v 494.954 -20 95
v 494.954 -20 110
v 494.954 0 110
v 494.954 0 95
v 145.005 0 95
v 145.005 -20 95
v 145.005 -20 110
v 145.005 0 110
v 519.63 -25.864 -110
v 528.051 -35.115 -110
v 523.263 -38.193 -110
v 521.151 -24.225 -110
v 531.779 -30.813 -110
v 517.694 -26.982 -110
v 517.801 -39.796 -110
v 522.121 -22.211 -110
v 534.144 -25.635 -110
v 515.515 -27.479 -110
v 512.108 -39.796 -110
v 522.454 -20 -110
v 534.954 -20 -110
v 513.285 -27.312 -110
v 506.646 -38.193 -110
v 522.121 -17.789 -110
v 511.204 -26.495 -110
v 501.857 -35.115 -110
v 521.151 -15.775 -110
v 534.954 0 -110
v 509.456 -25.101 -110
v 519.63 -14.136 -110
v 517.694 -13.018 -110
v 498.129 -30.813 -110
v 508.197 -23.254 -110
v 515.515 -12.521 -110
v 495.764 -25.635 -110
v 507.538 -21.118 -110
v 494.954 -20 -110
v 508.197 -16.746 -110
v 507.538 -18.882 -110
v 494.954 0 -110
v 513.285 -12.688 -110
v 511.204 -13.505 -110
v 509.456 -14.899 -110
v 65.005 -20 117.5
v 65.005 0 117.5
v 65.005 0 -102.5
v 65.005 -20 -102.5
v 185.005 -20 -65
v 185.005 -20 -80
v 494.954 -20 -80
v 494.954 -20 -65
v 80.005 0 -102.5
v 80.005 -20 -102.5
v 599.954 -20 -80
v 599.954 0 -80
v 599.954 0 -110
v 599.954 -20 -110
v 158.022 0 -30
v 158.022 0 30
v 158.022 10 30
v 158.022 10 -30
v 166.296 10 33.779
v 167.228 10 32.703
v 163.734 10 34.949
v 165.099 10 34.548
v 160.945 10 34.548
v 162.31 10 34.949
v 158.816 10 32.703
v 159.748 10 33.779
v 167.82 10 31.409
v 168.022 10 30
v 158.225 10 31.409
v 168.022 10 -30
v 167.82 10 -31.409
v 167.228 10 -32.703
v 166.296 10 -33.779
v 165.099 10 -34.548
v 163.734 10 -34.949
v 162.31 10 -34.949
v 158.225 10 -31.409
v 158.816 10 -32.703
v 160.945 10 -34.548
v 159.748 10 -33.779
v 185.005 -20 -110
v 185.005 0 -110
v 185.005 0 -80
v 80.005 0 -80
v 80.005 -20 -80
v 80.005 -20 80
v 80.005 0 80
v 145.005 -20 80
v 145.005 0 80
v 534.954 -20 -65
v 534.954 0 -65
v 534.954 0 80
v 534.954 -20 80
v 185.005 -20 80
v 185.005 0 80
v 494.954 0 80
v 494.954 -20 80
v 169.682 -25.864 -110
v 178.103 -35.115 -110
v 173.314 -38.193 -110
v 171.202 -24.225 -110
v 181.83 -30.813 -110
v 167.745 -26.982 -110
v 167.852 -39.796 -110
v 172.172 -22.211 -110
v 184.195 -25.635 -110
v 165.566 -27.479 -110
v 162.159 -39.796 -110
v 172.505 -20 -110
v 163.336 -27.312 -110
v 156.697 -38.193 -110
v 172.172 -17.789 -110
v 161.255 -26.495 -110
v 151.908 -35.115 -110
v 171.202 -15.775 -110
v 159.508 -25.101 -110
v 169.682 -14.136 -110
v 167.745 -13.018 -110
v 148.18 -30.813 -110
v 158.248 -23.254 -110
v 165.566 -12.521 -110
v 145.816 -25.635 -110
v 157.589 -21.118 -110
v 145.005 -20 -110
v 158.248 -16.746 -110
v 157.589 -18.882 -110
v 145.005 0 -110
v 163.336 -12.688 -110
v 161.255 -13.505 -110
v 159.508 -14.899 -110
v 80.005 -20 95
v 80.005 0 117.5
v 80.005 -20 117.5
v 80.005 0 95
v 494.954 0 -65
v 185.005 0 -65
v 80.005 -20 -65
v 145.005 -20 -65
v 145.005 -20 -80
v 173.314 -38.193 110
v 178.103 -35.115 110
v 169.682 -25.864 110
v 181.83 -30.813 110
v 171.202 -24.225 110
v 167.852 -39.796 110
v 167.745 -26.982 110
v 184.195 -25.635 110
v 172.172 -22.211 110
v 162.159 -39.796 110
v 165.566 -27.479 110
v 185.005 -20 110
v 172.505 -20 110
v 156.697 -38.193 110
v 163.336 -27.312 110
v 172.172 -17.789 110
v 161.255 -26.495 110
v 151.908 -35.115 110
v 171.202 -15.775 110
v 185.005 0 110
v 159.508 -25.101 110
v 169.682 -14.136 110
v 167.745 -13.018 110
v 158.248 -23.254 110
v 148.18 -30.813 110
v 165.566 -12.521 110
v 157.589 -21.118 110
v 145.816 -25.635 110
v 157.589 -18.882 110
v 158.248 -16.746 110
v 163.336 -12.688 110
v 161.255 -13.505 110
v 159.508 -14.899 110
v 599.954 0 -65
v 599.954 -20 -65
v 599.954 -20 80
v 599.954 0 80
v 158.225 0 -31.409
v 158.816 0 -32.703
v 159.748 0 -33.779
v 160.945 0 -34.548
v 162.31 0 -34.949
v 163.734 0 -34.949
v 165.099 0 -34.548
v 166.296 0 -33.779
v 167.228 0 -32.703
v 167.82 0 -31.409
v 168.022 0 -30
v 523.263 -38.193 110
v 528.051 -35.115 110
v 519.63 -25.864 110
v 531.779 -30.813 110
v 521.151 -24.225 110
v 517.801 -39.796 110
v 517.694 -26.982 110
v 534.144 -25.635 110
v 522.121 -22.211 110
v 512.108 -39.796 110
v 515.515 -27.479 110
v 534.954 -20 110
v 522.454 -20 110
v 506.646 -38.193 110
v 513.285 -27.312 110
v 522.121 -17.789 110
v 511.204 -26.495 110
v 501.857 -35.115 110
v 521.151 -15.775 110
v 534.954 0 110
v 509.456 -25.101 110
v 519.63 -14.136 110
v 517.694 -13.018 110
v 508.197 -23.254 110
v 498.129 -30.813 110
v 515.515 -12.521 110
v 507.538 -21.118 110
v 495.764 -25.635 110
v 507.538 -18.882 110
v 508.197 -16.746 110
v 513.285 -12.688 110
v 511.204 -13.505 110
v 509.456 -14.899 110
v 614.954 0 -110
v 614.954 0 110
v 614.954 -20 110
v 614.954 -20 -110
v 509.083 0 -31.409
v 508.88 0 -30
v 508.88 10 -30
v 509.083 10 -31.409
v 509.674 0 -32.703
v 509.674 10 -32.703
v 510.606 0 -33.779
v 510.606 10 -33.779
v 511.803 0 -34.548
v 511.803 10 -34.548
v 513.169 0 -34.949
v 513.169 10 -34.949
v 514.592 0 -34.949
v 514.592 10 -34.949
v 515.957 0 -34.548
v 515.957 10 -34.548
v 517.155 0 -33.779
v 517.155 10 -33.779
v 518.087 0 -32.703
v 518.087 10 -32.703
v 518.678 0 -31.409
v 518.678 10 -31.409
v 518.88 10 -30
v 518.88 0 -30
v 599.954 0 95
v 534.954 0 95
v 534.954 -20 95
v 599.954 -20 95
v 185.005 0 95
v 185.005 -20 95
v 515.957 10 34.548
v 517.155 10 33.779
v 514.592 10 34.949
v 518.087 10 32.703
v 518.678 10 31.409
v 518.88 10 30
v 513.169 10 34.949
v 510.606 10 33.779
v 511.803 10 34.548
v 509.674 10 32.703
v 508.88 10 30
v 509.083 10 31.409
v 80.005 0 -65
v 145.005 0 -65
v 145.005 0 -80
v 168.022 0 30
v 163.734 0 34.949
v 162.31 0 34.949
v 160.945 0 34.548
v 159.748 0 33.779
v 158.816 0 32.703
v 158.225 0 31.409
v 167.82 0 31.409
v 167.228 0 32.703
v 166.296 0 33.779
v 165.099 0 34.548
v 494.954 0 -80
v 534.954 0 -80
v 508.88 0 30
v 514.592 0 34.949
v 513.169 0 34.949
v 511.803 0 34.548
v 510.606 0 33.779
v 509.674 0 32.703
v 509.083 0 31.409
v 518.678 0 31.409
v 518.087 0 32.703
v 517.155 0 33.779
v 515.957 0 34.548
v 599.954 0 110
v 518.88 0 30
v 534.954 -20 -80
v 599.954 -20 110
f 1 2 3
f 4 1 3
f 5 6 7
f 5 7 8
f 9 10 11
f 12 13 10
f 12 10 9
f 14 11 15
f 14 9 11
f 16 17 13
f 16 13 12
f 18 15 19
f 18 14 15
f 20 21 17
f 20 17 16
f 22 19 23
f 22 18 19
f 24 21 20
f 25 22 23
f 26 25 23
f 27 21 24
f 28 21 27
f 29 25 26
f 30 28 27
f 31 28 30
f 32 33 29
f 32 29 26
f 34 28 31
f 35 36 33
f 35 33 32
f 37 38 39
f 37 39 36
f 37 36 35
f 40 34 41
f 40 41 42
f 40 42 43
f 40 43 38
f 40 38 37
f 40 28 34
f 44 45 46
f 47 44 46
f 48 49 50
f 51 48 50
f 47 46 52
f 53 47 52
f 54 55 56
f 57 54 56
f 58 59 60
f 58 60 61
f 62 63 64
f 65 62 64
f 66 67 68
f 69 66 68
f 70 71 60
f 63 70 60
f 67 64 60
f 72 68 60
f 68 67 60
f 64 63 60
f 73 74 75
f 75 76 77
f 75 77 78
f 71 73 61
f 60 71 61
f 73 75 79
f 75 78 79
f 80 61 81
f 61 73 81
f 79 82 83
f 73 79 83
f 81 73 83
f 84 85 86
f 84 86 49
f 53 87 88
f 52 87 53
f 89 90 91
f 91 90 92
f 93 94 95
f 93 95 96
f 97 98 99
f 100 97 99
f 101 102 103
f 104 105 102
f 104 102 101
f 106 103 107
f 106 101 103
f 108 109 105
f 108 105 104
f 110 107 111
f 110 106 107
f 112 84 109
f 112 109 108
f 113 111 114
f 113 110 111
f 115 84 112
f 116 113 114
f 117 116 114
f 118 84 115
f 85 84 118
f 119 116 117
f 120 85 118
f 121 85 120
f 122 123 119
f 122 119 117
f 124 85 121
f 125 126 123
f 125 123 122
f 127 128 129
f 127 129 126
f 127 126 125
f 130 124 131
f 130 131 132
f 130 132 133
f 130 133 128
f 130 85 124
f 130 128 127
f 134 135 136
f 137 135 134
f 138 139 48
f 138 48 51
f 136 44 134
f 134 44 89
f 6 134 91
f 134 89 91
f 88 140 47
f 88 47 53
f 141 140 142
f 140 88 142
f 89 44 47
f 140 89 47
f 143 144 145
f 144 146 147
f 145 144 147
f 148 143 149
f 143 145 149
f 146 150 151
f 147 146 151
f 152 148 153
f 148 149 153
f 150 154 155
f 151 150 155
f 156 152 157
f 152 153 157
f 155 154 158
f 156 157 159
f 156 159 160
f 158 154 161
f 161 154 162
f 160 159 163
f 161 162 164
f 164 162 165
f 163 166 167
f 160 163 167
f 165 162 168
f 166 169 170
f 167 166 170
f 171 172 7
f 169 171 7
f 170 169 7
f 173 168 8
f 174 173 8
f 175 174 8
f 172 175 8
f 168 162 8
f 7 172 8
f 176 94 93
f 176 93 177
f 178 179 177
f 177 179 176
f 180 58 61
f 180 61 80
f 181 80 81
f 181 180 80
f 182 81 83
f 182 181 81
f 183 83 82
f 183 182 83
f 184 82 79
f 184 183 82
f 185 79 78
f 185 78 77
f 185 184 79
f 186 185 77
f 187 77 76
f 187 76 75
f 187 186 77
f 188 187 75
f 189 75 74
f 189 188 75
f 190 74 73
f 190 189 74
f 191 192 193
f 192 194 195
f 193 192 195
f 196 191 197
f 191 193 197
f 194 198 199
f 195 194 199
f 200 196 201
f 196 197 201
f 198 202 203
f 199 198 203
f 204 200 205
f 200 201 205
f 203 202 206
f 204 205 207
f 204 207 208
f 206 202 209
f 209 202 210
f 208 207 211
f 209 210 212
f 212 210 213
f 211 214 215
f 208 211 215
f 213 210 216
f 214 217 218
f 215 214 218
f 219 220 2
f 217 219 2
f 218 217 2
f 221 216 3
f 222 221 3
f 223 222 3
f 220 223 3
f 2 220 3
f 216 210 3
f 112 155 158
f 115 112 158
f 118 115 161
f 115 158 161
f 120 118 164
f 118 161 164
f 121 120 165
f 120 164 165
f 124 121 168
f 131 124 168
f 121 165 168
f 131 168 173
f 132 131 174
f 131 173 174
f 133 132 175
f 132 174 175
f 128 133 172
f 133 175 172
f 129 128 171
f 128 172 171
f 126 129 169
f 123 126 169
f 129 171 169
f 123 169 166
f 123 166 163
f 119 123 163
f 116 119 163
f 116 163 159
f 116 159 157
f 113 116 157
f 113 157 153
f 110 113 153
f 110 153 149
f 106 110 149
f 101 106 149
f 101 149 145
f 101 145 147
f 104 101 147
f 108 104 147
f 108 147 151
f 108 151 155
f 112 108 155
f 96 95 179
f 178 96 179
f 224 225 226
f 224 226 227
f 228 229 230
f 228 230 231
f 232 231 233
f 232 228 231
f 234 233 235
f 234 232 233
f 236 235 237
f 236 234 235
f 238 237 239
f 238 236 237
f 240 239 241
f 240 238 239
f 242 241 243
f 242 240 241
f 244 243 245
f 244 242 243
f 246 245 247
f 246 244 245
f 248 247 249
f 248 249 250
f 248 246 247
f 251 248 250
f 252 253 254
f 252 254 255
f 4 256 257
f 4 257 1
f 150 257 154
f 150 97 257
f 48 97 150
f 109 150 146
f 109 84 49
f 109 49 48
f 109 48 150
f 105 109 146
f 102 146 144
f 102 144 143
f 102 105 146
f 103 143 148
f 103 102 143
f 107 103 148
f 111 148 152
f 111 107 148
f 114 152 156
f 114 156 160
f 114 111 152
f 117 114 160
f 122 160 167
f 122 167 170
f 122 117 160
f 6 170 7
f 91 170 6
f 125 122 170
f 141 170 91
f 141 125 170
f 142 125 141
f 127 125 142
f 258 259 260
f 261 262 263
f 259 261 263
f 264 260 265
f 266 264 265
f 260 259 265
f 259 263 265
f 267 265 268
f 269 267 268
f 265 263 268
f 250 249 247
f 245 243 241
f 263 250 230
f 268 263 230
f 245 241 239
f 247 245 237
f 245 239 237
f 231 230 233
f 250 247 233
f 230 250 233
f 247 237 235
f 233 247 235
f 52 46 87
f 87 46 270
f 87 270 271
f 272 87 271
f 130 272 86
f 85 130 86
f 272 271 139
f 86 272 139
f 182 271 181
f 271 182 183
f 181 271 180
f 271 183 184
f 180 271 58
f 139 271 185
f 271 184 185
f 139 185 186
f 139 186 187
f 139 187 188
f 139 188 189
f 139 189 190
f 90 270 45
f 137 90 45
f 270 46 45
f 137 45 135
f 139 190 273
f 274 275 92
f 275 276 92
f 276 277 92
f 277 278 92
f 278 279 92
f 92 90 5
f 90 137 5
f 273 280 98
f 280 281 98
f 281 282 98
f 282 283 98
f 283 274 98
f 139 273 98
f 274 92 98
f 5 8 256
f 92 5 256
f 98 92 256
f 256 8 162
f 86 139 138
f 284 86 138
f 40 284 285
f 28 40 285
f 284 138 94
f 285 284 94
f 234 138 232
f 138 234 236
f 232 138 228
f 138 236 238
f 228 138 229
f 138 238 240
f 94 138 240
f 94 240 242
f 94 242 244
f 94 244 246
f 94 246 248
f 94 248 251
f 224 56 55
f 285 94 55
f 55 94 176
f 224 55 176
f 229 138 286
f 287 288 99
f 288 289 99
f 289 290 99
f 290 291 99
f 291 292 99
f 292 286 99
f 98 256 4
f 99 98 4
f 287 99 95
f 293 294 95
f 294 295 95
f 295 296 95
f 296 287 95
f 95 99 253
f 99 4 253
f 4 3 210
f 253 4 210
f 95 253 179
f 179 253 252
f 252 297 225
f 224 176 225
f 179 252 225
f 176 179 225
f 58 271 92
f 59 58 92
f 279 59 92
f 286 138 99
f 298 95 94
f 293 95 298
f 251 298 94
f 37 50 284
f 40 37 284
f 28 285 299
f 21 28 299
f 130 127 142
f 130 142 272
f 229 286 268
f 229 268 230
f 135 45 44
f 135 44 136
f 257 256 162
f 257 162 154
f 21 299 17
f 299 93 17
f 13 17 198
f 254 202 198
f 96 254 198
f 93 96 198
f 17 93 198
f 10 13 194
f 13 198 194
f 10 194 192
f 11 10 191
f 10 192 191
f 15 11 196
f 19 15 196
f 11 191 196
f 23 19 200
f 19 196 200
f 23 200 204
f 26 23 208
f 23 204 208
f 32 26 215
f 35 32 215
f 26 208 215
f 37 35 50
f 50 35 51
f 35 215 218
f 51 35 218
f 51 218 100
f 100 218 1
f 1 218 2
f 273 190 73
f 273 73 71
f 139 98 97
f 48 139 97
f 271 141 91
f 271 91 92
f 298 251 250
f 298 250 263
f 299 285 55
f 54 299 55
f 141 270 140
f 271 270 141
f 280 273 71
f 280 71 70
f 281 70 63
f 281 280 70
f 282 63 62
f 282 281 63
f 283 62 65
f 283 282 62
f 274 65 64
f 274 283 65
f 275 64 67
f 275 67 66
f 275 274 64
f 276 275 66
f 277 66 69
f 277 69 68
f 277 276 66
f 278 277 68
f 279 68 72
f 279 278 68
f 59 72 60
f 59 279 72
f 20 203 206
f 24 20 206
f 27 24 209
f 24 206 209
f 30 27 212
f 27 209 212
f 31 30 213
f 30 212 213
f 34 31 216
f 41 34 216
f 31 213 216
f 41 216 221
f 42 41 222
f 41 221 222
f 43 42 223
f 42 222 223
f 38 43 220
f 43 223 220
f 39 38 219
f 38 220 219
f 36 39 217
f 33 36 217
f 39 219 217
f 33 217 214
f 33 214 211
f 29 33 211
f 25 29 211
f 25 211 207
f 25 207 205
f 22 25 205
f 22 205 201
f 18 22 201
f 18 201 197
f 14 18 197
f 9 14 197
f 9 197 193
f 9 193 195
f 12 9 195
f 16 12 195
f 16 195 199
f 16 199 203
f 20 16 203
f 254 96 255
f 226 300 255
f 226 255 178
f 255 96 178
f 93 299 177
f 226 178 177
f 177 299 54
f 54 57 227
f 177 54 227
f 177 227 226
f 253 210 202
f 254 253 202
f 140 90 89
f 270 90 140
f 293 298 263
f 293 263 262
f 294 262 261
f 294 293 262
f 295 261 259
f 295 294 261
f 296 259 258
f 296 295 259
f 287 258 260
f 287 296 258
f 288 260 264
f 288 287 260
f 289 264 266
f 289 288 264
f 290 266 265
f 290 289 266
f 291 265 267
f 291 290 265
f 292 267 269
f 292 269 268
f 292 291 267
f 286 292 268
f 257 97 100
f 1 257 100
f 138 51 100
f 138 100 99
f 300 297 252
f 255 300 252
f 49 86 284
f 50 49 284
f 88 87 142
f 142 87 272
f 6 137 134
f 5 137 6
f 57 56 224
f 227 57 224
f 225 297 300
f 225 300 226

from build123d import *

# Parameters (mm, degrees)
SKETCH1_W           = 15
SKETCH1_H           = 220
SKETCH1_W_2         = 519.948861259
SKETCH1_H_2         = 15
BOSS_EXTRUDE1_DEPTH = 20
BOSS_EXTRUDE3_DEPTH = 110
SKETCH3_R           = 7.5
CUT_EXTRUDE1_DEPTH  = 655.346046928
BOSS_EXTRUDE5_DEPTH = 10


with BuildPart() as part:
    # Sketch1 → Boss-Extrude1 (new body)
    with BuildSketch(Plane(origin=(0, 0, 0), x_dir=(1, 0, 0), z_dir=(0, 1, 0))):
        with Locations((72.505405333, -7.5)):
            Rectangle(SKETCH1_W, SKETCH1_H)
        with Locations((607.454266592, 0)):
            Rectangle(SKETCH1_W, SKETCH1_H)
        with Locations((339.979835963, 72.5)):
            Rectangle(SKETCH1_W_2, SKETCH1_H_2)
        with Locations((339.979835963, -87.5)):
            Rectangle(SKETCH1_W_2, SKETCH1_H_2)
    extrude(amount=-BOSS_EXTRUDE1_DEPTH)

    # Sketch2 → Boss-Extrude3 (add, symmetric)
    with BuildSketch(Plane.XY):
        with BuildLine():
            Line((145.005405333, 0), (185.005405333, 0))
            Line((185.005405333, 0), (185.005405333, -20))
            ThreePointArc((185.005405333, -20), (165.005392368, -39.99997407), (145.005405333, -19.99997407))
            Line((145.005405333, -19.99997407), (145.005405333, 0))
        make_face()
        with BuildLine():
            Line((494.954266592, 0), (534.954266592, 0))
            Line((534.954266592, 0), (534.954266592, -20))
            ThreePointArc((534.954266592, -20), (514.954261153, -39.999989122), (494.954266592, -19.999989122))
            Line((494.954266592, -19.999989122), (494.954266592, 0))
        make_face()
    extrude(amount=BOSS_EXTRUDE3_DEPTH, both=True)

    # Sketch3 → Cut-Extrude1 (cut, through all)
    with BuildSketch(Plane.XY.offset(110)):
        with Locations((165.005405333, -19.99997407)):
            Circle(SKETCH3_R)
        with Locations((514.954266592, -19.999989122)):
            Circle(SKETCH3_R)
    extrude(amount=-CUT_EXTRUDE1_DEPTH, mode=Mode.SUBTRACT)

    # Sketch4 → Boss-Extrude5 (add)
    with BuildSketch(Plane(origin=(0, 0, 0), x_dir=(1, 0, 0), z_dir=(0, 1, 0))):
        with BuildLine():
            Line((158.022043154, -30), (158.022043154, 30))
            ThreePointArc((158.022043154, 30), (163.022043154, 35), (168.022043154, 30))
            Line((168.022043154, 30), (168.022043154, -30))
            ThreePointArc((168.022043154, -30), (163.022043154, -35), (158.022043154, -30))
        make_face()
        with BuildLine():
            Line((508.880344162, -30), (508.880344162, 30))
            ThreePointArc((508.880344162, 30), (513.880344162, 35), (518.880344162, 30))
            Line((518.880344162, 30), (518.880344162, -30))
            ThreePointArc((518.880344162, -30), (513.880344162, -35), (508.880344162, -30))
        make_face()
    extrude(amount=BOSS_EXTRUDE5_DEPTH)


solid = part.part
